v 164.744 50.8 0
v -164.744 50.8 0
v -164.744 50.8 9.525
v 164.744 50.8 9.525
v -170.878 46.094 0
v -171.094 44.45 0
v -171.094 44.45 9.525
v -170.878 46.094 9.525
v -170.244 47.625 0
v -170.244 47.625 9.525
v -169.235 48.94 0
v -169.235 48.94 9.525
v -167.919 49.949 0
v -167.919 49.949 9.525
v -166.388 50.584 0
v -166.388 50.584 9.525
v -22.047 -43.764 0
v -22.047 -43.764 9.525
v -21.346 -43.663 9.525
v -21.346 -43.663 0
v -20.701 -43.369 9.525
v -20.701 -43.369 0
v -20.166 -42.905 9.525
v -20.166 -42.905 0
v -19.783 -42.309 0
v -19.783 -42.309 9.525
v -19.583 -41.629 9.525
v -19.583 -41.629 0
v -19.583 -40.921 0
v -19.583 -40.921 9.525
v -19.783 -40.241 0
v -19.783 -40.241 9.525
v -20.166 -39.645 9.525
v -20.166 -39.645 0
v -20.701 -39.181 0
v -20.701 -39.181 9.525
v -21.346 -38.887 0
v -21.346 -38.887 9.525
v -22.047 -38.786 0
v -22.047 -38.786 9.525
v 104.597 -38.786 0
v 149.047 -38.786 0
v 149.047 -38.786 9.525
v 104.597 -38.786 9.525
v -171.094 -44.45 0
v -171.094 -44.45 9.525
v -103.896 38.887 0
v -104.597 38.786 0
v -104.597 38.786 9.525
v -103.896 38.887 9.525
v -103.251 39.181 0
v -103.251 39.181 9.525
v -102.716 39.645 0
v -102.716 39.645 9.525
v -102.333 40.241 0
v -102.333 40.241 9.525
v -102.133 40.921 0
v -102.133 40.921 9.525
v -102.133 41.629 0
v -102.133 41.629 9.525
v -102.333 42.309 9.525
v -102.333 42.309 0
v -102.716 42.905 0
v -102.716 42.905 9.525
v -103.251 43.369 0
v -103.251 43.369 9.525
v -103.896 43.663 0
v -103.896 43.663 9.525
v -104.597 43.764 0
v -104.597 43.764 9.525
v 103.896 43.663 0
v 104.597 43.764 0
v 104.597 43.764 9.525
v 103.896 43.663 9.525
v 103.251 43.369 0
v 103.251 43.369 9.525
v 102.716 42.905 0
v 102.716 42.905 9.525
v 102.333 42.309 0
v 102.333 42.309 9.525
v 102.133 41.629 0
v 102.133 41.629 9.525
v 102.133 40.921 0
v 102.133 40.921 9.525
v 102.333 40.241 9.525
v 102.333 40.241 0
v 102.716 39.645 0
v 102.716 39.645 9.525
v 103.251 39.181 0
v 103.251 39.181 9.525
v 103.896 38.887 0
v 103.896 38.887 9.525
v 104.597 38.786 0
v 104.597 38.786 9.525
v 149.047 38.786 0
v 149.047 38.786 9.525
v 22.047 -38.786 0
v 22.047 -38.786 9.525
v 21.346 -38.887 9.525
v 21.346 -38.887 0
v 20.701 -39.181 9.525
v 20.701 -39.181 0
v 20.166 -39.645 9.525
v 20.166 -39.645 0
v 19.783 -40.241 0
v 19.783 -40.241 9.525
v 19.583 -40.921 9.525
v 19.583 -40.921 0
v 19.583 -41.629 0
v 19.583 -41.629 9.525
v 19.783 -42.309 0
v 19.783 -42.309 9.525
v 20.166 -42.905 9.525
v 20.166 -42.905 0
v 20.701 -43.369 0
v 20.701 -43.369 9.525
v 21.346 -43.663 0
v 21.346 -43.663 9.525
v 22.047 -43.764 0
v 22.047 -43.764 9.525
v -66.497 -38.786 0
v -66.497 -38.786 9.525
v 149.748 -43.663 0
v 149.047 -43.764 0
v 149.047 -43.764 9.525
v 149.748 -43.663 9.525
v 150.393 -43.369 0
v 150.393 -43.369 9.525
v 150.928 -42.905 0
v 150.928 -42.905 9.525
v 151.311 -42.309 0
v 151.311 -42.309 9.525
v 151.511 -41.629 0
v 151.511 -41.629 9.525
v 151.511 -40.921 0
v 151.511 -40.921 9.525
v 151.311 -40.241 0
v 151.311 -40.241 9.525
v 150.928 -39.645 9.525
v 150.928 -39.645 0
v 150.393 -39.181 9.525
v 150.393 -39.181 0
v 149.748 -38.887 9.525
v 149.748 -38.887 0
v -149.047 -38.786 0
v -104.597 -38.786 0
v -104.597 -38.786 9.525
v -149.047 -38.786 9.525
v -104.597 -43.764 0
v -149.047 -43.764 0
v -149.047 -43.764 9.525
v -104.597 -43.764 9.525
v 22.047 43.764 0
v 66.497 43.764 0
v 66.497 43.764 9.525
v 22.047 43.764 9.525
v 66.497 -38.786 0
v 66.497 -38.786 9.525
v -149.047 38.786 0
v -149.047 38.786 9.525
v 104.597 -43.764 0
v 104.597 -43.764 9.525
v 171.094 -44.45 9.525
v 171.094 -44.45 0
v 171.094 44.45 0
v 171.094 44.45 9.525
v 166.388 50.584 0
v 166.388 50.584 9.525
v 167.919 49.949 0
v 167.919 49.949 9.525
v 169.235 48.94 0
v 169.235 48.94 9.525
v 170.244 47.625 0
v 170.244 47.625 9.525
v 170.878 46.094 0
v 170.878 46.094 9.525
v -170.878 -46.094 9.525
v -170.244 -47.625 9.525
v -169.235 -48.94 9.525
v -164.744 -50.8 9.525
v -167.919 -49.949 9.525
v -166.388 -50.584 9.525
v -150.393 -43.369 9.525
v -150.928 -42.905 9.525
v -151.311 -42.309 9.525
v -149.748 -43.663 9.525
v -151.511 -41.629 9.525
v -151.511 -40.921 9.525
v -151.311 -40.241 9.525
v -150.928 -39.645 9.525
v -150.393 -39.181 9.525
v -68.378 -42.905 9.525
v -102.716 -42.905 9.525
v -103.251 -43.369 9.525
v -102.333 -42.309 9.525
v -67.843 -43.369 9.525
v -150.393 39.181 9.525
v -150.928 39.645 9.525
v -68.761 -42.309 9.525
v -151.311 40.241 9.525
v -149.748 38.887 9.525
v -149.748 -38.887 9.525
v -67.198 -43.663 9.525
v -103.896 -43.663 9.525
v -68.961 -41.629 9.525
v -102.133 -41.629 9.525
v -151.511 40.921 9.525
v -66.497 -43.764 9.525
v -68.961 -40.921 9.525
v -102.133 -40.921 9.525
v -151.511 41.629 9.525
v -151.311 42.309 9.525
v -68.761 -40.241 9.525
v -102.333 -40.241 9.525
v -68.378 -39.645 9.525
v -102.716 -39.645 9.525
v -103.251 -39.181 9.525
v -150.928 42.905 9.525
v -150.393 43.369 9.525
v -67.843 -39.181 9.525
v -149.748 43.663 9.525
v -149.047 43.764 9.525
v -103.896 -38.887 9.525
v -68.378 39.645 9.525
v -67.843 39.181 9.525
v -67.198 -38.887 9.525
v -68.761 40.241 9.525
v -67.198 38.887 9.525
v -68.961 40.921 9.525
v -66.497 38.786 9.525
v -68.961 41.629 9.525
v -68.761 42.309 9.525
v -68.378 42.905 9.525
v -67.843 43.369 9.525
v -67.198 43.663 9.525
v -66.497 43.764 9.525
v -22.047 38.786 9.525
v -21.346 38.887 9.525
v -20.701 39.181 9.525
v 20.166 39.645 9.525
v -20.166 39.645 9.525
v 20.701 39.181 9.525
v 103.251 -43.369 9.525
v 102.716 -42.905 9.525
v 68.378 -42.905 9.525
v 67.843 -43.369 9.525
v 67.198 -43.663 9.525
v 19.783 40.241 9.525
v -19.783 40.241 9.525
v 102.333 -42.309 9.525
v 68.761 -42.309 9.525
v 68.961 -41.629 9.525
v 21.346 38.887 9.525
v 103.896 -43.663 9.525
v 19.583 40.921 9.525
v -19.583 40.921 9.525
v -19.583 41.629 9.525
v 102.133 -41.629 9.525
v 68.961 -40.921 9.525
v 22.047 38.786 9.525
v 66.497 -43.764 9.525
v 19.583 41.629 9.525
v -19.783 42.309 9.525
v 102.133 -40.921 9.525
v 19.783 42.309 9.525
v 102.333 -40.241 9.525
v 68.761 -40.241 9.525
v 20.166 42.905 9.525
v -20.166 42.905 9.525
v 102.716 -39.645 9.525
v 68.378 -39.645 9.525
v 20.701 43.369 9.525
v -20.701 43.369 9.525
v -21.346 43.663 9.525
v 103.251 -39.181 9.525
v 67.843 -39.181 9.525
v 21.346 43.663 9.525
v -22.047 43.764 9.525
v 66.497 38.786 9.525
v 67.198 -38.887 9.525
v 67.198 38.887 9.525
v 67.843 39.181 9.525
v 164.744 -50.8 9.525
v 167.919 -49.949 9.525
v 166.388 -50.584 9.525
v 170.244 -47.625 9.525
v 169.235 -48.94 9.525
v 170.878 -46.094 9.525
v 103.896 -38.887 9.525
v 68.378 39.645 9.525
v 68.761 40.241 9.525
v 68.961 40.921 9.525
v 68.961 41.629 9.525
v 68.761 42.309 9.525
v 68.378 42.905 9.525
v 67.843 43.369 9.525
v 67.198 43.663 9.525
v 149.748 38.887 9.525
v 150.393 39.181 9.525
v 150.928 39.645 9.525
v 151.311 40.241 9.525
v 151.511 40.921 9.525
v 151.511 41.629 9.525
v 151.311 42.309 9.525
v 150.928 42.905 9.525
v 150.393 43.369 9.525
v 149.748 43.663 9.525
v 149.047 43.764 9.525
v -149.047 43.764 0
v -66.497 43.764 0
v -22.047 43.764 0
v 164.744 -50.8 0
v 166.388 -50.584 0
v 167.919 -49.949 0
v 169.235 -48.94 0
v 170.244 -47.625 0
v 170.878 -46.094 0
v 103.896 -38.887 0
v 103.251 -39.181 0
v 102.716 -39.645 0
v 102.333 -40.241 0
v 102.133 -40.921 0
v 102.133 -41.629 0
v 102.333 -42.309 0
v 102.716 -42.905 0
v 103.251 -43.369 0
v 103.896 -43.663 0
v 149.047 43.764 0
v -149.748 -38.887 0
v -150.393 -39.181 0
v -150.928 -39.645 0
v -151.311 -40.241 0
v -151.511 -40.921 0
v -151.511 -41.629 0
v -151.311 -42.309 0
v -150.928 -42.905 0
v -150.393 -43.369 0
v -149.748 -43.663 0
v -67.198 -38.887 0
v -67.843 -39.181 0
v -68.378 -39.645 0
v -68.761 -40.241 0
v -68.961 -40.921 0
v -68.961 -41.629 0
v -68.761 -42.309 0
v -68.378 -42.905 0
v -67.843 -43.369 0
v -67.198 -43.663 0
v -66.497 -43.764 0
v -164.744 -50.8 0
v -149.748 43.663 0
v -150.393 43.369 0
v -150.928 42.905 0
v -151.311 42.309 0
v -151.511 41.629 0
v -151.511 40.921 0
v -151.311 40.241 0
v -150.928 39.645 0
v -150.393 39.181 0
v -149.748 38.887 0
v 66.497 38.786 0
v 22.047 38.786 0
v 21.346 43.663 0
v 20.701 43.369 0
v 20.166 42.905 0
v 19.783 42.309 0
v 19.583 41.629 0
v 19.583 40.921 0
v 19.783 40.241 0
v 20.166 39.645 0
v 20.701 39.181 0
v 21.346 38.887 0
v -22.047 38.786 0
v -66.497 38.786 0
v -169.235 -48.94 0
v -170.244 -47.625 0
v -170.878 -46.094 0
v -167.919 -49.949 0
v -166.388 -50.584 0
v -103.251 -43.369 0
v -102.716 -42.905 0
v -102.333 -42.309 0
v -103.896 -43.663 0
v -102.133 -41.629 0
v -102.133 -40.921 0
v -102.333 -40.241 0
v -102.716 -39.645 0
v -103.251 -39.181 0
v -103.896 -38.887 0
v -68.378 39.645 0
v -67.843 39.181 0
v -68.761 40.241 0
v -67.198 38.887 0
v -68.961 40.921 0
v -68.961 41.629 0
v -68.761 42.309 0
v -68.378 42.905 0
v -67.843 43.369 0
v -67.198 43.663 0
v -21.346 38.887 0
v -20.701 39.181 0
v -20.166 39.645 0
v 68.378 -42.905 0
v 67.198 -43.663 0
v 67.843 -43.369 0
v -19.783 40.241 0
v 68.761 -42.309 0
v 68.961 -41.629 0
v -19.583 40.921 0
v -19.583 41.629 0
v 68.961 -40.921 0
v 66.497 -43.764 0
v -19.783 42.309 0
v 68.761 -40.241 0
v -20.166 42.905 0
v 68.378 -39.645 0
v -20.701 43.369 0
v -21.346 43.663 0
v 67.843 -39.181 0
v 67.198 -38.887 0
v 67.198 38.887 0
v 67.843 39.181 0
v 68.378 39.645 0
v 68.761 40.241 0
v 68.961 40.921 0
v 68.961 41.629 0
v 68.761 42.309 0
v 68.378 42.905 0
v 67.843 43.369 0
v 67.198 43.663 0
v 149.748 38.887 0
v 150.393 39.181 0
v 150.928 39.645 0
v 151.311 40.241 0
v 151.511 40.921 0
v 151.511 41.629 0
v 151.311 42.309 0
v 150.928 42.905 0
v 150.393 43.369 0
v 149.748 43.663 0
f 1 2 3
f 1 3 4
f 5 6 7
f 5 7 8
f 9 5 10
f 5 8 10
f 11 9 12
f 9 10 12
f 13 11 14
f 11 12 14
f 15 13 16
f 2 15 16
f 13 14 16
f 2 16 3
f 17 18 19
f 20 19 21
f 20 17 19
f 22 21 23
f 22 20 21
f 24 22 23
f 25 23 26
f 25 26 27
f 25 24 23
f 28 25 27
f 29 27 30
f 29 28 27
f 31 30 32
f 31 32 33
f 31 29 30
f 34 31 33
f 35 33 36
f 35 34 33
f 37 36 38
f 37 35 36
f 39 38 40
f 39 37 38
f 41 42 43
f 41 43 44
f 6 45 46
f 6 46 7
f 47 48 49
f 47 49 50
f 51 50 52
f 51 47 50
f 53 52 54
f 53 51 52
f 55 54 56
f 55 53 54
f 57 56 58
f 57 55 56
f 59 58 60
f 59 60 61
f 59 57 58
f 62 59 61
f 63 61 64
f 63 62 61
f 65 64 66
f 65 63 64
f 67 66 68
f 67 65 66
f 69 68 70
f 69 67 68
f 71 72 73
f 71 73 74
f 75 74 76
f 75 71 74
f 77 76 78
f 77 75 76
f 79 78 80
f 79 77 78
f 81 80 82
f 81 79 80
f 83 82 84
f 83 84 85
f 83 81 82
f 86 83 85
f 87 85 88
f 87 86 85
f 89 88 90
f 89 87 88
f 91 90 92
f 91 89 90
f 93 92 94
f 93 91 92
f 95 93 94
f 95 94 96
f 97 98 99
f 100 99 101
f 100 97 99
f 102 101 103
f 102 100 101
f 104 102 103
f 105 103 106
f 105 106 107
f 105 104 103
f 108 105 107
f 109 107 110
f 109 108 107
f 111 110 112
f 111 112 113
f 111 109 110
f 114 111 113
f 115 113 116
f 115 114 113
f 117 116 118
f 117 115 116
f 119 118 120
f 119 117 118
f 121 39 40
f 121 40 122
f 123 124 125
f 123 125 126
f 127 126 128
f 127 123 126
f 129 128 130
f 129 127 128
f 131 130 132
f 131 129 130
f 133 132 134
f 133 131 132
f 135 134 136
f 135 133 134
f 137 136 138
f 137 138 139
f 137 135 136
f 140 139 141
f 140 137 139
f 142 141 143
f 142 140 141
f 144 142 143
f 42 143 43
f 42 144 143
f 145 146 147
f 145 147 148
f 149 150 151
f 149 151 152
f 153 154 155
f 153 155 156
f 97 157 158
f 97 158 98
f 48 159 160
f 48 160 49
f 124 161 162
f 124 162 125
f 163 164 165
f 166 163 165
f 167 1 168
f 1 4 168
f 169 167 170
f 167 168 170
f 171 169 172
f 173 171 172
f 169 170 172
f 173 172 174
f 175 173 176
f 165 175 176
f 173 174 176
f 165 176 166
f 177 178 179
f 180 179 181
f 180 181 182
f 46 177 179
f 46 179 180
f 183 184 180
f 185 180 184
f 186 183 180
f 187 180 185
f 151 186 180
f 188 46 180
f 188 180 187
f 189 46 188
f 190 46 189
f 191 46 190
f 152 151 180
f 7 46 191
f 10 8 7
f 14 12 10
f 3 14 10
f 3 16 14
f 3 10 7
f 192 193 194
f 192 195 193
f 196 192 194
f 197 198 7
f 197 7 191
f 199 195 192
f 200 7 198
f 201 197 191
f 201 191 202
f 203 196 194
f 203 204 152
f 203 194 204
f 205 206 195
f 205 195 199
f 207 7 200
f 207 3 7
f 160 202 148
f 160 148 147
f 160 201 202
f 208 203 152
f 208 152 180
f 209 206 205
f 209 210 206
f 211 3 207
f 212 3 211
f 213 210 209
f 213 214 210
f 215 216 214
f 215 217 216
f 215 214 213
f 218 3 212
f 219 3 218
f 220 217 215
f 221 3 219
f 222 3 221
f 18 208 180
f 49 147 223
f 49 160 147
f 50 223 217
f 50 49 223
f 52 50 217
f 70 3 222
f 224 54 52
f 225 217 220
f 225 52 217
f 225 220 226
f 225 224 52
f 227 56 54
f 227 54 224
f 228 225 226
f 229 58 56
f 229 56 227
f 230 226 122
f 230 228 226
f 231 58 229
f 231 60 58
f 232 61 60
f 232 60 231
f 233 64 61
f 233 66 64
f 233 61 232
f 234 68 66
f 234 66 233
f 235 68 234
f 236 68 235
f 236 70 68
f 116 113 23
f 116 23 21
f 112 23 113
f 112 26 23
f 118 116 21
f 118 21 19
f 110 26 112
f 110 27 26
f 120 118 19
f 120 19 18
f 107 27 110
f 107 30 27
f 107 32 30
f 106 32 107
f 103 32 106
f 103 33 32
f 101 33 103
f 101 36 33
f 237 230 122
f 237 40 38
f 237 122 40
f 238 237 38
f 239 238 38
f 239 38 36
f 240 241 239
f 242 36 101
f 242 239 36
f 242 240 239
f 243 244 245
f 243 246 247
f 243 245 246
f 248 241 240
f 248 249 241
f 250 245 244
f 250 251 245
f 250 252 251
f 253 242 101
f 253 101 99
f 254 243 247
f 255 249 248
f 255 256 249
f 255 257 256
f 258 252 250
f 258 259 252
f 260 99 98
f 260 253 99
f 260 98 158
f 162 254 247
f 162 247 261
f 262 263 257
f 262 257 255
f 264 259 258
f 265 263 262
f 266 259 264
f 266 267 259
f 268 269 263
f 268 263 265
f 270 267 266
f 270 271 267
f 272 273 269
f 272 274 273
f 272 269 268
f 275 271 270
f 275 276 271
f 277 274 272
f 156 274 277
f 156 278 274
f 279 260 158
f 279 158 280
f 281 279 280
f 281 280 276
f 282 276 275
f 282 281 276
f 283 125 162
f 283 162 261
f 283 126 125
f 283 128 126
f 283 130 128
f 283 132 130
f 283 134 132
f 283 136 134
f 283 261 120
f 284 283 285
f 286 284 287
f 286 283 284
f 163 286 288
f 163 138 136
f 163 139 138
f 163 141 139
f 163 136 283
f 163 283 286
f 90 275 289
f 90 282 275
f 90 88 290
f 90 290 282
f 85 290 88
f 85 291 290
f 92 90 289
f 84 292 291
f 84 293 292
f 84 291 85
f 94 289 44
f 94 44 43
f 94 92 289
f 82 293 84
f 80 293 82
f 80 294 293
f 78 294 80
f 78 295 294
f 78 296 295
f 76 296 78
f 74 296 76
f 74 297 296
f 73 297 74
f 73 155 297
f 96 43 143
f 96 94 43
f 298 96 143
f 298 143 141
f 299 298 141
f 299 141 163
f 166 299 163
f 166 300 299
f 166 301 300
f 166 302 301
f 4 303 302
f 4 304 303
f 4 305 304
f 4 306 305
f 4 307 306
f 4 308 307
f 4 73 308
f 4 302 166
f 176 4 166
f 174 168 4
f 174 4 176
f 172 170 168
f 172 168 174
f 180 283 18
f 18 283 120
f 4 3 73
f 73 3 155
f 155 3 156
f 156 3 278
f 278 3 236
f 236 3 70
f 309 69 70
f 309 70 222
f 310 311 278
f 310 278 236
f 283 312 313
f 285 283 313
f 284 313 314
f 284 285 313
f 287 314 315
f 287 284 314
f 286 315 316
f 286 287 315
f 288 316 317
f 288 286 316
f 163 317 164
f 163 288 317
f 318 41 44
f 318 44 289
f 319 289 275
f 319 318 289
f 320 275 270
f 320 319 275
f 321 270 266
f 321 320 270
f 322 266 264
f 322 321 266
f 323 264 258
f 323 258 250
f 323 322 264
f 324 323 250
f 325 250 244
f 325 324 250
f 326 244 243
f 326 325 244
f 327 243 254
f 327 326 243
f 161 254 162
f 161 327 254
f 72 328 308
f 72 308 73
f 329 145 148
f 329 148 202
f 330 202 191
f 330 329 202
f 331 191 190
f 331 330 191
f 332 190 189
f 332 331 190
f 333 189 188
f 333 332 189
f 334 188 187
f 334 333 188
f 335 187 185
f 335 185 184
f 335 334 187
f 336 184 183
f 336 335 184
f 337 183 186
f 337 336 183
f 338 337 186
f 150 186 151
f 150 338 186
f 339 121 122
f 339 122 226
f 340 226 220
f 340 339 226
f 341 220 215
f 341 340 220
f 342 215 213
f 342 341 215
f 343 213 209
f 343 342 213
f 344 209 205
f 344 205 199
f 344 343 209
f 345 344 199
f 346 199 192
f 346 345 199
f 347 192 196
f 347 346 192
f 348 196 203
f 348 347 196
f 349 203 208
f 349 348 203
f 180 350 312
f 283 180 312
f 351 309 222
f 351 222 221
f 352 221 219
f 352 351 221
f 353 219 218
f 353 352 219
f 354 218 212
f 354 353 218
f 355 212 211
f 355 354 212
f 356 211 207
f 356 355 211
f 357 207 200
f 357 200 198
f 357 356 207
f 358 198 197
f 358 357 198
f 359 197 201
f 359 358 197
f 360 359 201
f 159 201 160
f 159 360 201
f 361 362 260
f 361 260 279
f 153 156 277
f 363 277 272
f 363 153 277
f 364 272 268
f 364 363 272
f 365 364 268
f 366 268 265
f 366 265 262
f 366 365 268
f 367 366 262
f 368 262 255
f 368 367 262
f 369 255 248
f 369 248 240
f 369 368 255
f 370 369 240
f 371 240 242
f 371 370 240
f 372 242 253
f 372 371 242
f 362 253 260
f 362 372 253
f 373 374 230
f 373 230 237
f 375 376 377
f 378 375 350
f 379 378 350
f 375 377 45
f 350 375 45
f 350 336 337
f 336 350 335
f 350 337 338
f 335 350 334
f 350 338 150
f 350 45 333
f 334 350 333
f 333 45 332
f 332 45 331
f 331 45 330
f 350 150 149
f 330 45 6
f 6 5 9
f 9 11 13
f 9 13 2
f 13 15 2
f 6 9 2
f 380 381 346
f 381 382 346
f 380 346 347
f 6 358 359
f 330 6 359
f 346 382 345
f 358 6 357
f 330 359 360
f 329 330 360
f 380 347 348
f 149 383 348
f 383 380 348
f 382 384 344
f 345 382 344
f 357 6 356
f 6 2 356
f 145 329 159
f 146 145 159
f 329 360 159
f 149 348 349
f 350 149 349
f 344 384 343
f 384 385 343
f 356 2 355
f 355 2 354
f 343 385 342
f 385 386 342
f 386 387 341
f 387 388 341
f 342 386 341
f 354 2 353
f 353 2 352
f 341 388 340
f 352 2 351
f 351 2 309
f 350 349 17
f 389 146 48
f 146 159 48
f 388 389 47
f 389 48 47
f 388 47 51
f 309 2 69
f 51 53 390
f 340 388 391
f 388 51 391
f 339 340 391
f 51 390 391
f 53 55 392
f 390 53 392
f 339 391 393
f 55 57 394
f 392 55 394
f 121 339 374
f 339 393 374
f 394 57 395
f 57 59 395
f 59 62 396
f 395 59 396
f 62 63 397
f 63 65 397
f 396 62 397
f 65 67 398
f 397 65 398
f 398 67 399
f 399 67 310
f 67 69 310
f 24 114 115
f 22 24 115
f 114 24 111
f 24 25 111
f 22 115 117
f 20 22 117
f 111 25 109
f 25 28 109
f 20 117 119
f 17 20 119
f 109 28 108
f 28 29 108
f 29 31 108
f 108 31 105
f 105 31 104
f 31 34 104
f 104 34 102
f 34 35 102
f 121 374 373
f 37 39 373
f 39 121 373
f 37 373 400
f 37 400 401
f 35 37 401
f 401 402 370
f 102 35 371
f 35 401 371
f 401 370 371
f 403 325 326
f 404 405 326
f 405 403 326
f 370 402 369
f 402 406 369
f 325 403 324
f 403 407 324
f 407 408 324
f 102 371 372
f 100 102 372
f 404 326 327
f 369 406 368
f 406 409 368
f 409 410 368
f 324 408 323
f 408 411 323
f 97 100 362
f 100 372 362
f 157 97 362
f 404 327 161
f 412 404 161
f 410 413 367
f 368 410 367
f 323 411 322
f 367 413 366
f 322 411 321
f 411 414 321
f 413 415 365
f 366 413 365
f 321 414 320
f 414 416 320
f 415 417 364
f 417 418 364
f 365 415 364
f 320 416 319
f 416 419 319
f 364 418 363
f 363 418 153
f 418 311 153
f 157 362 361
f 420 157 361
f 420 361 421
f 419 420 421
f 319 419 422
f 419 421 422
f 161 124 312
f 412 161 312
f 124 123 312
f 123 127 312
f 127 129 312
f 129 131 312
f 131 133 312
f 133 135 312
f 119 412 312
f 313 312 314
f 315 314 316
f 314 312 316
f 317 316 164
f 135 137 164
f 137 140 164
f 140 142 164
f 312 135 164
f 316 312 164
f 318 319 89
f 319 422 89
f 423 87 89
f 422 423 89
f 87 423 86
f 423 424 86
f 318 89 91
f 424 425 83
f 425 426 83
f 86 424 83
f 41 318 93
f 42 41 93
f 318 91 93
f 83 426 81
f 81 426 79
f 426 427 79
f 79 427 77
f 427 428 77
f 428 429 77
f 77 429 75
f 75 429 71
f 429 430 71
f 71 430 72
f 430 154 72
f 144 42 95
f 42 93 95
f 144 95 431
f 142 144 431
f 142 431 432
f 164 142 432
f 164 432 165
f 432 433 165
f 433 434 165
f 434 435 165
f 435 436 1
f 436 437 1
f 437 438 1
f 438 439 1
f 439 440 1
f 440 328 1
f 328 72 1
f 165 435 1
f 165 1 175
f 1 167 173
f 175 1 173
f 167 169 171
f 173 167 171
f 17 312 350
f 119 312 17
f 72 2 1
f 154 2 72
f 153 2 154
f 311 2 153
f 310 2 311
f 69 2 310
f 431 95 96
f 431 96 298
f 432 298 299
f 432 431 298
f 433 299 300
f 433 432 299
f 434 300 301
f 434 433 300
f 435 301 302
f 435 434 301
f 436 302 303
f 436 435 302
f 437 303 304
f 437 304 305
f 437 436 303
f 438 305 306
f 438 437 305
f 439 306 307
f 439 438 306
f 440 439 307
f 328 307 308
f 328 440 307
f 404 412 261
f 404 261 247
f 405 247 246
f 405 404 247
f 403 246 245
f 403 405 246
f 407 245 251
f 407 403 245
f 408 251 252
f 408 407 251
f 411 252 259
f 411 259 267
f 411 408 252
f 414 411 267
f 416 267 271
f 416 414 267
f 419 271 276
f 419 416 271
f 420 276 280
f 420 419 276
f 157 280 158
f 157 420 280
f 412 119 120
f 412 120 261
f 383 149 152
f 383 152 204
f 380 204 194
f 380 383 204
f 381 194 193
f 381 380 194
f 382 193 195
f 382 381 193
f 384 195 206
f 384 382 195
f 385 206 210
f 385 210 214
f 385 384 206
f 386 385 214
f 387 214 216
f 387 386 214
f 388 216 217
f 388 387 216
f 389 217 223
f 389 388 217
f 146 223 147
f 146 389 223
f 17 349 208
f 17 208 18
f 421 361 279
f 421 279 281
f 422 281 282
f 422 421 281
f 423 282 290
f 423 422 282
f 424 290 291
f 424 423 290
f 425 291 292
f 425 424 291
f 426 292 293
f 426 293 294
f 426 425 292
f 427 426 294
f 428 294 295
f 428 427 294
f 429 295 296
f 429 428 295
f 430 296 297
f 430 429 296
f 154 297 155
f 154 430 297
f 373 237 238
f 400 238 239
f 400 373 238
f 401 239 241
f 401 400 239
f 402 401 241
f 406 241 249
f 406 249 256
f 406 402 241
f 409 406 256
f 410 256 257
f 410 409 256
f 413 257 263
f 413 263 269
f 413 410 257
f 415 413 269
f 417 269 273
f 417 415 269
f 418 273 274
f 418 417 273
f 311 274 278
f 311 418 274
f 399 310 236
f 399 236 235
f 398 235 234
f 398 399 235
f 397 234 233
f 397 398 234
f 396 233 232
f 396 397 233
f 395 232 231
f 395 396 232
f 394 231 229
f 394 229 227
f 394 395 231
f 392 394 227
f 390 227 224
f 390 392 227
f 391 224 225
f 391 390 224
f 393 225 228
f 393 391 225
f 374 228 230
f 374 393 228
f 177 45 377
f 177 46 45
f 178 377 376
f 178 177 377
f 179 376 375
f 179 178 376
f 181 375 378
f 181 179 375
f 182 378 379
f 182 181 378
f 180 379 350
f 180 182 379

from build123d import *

# Parameters (mm, degrees)
SKETCH1_W                  = 342.1888
SKETCH1_H                  = 101.6
BOSS_EXTRUDE1_DEPTH        = 9.525
F_10_CLEARANCE_SLOT1_DEPTH = 9.525
FILLET1_R                  = 6.35


# Read off the part's stored shape, not the designer's step: #10 Clearance Slot1
with BuildPart() as part:
    # Sketch1 → Boss-Extrude1 (new body)
    with BuildSketch(Plane.XY):
        Rectangle(SKETCH1_W, SKETCH1_H)
    extrude(amount=BOSS_EXTRUDE1_DEPTH)

    # #10 Clearance Slot1 outline → #10 Clearance Slot1 (cut)
    with BuildSketch(Plane.XY):
        with BuildLine():
            Line((-149.0472, 38.7858), (-104.5972, 38.7858))
            ThreePointArc((-104.5972, 38.7858), (-102.108, 41.275), (-104.5972, 43.7642))
            Line((-104.5972, 43.7642), (-149.0472, 43.7642))
            ThreePointArc((-149.0472, 43.7642), (-151.5364, 41.275), (-149.0472, 38.7858))
        make_face()
        with BuildLine():
            ThreePointArc((-22.0472, 38.7858), (-19.558, 41.275), (-22.0472, 43.7642))
            Line((-22.0472, 43.7642), (-66.4972, 43.7642))
            ThreePointArc((-66.4972, 43.7642), (-68.9864, 41.275), (-66.4972, 38.7858))
            Line((-66.4972, 38.7858), (-22.0472, 38.7858))
        make_face()
        with BuildLine():
            ThreePointArc((66.4972, 38.7858), (68.9864, 41.275), (66.4972, 43.7642))
            Line((66.4972, 43.7642), (22.0472, 43.7642))
            ThreePointArc((22.0472, 43.7642), (19.558, 41.275), (22.0472, 38.7858))
            Line((22.0472, 38.7858), (66.4972, 38.7858))
        make_face()
        with BuildLine():
            ThreePointArc((149.0472, 38.7858), (151.5364, 41.275), (149.0472, 43.7642))
            Line((149.0472, 43.7642), (104.5972, 43.7642))
            ThreePointArc((104.5972, 43.7642), (102.108, 41.275), (104.5972, 38.7858))
            Line((104.5972, 38.7858), (149.0472, 38.7858))
        make_face()
        with BuildLine():
            Line((104.5972, -43.7642), (149.0472, -43.7642))
            ThreePointArc((149.0472, -43.7642), (151.5364, -41.275), (149.0472, -38.7858))
            Line((149.0472, -38.7858), (104.5972, -38.7858))
            ThreePointArc((104.5972, -38.7858), (102.108, -41.275), (104.5972, -43.7642))
        make_face()
        with BuildLine():
            ThreePointArc((66.4972, -43.7642), (68.9864, -41.275), (66.4972, -38.7858))
            Line((66.4972, -38.7858), (22.0472, -38.7858))
            ThreePointArc((22.0472, -38.7858), (19.558, -41.275), (22.0472, -43.7642))
            Line((22.0472, -43.7642), (66.4972, -43.7642))
        make_face()
        with BuildLine():
            ThreePointArc((-22.0472, -43.7642), (-19.558, -41.275), (-22.0472, -38.7858))
            Line((-22.0472, -38.7858), (-66.4972, -38.7858))
            ThreePointArc((-66.4972, -38.7858), (-68.9864, -41.275), (-66.4972, -43.7642))
            Line((-66.4972, -43.7642), (-22.0472, -43.7642))
        make_face()
        with BuildLine():
            ThreePointArc((-104.5972, -43.7642), (-102.108, -41.275), (-104.5972, -38.7858))
            Line((-104.5972, -38.7858), (-149.0472, -38.7858))
            ThreePointArc((-149.0472, -38.7858), (-151.5364, -41.275), (-149.0472, -43.7642))
            Line((-149.0472, -43.7642), (-104.5972, -43.7642))
        make_face()
    extrude(amount=F_10_CLEARANCE_SLOT1_DEPTH, mode=Mode.SUBTRACT)

    # Fillet1
    fillet1_edges = [part.edges().sort_by_distance(p)[0] for p in [
        (-171.0944, 50.8, 4.7625),
        (171.0944, 50.8, 4.7625),
        (171.0944, -50.8, 4.7625),
        (-171.0944, -50.8, 4.7625),
    ]]
    fillet(fillet1_edges, radius=FILLET1_R)


solid = part.part
